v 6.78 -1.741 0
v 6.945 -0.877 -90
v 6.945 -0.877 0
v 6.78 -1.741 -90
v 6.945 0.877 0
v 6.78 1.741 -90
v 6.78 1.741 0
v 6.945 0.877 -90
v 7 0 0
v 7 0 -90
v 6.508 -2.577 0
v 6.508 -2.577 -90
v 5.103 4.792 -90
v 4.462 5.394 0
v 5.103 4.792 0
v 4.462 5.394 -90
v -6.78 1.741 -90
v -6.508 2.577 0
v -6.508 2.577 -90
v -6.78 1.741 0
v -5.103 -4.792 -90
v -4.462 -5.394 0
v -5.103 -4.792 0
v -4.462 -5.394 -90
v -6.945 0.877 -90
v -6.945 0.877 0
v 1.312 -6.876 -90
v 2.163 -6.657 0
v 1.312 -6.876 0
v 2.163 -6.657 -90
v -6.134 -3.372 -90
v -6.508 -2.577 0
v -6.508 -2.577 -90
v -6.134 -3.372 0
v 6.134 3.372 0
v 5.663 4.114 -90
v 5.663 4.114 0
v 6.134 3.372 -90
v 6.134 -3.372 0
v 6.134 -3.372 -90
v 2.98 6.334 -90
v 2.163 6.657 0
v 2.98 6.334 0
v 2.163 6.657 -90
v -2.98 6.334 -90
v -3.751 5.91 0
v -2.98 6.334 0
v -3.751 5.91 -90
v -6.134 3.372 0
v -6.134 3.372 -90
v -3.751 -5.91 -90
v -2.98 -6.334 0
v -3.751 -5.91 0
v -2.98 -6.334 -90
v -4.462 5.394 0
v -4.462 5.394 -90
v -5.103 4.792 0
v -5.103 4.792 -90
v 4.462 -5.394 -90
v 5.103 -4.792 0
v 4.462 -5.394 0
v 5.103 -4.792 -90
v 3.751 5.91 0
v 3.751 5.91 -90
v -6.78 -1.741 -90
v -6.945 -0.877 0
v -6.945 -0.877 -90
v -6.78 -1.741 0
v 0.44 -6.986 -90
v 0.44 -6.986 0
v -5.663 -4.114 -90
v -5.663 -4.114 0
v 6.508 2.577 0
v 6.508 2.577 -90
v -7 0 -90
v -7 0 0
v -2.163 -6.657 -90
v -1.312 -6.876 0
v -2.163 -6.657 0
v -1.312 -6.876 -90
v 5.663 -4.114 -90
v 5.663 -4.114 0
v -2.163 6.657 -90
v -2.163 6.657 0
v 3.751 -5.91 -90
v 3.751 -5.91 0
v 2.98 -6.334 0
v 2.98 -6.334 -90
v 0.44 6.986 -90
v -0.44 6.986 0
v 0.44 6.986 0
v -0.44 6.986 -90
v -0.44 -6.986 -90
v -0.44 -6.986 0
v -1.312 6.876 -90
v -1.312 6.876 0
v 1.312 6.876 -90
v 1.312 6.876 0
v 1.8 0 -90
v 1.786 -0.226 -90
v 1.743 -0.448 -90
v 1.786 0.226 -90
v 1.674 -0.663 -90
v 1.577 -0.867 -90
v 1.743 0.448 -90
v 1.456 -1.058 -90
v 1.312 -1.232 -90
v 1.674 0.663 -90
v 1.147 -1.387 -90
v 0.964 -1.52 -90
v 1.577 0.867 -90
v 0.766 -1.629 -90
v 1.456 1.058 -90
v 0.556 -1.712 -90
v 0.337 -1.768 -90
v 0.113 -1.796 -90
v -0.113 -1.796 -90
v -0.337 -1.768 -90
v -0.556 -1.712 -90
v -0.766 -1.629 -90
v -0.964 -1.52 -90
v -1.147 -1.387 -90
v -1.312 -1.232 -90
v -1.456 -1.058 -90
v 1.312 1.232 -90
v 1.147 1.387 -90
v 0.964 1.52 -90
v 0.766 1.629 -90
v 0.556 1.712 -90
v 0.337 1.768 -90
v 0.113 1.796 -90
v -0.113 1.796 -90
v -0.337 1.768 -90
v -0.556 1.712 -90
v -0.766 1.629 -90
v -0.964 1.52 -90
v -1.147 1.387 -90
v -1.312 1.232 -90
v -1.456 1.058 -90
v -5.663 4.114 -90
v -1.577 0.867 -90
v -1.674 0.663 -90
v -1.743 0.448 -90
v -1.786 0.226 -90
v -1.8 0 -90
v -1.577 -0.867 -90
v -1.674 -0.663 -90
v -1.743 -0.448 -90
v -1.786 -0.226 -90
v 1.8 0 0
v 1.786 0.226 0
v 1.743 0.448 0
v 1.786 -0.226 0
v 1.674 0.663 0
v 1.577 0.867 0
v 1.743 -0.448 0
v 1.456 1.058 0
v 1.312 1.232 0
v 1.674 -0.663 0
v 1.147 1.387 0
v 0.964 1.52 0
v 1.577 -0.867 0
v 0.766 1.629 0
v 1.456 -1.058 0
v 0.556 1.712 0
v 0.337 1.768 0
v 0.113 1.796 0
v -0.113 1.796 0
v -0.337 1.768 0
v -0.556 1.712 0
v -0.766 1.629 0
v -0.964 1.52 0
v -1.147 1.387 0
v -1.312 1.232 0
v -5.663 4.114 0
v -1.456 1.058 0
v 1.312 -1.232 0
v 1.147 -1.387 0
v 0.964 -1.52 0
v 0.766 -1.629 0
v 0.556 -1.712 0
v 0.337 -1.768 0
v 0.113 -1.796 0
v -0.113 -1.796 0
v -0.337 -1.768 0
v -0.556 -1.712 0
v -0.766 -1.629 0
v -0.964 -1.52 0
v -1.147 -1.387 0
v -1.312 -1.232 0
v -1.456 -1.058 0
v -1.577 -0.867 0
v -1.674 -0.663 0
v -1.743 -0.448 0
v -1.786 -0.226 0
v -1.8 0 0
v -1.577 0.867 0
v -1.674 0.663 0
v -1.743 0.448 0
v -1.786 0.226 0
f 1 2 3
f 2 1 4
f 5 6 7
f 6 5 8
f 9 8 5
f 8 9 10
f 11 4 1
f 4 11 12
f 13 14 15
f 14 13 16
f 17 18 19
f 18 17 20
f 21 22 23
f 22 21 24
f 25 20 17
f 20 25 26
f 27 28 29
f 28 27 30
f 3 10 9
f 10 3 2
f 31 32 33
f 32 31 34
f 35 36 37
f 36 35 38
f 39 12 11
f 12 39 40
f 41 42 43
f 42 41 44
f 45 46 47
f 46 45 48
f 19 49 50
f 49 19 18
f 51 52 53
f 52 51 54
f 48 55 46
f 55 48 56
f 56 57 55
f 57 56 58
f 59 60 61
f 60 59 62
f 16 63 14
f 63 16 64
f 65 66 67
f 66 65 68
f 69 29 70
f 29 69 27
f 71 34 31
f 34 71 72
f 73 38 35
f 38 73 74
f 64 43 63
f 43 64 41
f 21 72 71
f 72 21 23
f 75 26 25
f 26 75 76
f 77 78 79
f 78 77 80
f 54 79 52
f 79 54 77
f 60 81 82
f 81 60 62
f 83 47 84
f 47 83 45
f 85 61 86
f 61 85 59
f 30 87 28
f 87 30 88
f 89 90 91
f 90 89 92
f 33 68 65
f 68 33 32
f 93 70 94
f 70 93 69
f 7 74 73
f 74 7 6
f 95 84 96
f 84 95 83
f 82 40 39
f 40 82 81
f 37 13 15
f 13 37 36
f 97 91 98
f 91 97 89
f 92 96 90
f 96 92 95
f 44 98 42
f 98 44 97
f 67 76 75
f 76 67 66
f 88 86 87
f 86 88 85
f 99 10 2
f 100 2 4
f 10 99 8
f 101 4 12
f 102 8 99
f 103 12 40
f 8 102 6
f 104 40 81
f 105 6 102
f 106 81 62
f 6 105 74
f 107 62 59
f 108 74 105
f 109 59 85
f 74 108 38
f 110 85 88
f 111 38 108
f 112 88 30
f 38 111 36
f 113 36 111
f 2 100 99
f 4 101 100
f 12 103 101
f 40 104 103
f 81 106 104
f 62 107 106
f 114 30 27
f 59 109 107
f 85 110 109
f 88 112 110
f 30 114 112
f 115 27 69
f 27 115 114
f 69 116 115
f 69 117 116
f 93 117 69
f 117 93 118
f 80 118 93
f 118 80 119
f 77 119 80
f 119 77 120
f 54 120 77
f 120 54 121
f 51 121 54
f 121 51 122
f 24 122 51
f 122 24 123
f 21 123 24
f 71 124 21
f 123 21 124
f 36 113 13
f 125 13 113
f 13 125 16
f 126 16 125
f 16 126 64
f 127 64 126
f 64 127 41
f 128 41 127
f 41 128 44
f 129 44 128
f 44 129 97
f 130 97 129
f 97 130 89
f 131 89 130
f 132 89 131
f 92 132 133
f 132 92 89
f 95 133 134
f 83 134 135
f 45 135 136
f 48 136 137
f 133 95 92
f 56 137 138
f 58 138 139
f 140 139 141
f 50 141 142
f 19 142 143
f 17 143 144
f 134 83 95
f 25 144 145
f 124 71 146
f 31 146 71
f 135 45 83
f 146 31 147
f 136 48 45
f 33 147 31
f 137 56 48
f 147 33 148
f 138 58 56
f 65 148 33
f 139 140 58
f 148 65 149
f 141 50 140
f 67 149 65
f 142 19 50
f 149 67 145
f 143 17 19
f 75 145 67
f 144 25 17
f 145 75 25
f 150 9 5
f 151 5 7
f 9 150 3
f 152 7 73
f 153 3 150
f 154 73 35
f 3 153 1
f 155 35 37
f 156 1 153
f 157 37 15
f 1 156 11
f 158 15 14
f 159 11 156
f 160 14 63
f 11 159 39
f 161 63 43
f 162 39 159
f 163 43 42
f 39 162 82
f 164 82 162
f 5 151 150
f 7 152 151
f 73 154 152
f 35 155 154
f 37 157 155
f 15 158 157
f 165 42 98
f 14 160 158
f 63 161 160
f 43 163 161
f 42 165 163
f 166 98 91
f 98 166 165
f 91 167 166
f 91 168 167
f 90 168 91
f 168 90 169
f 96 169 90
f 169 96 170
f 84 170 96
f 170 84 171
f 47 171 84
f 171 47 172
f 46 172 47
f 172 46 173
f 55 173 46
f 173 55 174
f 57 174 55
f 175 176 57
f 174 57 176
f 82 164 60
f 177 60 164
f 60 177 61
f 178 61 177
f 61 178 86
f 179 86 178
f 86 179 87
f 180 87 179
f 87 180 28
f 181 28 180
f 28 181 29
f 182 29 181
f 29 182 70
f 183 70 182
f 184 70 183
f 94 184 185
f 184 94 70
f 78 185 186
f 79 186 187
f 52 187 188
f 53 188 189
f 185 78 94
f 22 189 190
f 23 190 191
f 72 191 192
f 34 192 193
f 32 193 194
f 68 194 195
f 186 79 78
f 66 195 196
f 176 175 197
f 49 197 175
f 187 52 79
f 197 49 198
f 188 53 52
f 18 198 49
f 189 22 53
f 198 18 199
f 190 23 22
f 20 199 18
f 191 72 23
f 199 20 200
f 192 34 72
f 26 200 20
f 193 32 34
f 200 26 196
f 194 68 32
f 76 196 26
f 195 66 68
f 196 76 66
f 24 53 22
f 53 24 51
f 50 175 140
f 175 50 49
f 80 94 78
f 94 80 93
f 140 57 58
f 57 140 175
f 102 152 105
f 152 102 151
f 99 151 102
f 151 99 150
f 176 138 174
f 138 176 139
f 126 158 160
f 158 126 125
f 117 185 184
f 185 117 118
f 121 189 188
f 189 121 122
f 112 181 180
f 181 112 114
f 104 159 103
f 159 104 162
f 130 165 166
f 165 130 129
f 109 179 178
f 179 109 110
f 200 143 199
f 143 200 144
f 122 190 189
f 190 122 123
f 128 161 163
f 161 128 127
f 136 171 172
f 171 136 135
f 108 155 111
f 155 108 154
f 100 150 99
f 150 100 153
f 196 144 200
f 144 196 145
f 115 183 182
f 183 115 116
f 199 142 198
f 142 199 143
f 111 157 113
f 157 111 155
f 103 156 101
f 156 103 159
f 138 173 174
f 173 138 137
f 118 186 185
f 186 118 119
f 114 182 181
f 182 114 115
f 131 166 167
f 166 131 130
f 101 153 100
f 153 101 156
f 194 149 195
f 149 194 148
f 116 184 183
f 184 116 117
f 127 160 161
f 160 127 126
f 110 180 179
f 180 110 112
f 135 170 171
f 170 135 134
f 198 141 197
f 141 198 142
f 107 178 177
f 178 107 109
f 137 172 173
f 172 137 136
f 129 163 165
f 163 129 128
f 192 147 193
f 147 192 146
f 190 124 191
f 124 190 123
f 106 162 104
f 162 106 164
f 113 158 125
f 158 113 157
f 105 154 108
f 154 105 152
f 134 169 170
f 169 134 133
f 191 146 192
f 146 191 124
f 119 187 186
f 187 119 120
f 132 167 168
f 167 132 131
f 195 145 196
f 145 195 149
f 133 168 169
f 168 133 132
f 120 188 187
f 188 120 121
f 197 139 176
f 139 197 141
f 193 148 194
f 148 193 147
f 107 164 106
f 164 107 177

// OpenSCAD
$fn = 50;


difference() {
	union() {
		translate(v = [0, 0, -90.0000000000]) {
			cylinder(h = 90, r = 7.0000000000);
		}
		cylinder(h = 0, r = 13.0000000000);
	}
	union() {
		#translate(v = [0, 0, -90]) {
			cylinder(h = 90, r = 1.8000000000);
		}
	}
}
